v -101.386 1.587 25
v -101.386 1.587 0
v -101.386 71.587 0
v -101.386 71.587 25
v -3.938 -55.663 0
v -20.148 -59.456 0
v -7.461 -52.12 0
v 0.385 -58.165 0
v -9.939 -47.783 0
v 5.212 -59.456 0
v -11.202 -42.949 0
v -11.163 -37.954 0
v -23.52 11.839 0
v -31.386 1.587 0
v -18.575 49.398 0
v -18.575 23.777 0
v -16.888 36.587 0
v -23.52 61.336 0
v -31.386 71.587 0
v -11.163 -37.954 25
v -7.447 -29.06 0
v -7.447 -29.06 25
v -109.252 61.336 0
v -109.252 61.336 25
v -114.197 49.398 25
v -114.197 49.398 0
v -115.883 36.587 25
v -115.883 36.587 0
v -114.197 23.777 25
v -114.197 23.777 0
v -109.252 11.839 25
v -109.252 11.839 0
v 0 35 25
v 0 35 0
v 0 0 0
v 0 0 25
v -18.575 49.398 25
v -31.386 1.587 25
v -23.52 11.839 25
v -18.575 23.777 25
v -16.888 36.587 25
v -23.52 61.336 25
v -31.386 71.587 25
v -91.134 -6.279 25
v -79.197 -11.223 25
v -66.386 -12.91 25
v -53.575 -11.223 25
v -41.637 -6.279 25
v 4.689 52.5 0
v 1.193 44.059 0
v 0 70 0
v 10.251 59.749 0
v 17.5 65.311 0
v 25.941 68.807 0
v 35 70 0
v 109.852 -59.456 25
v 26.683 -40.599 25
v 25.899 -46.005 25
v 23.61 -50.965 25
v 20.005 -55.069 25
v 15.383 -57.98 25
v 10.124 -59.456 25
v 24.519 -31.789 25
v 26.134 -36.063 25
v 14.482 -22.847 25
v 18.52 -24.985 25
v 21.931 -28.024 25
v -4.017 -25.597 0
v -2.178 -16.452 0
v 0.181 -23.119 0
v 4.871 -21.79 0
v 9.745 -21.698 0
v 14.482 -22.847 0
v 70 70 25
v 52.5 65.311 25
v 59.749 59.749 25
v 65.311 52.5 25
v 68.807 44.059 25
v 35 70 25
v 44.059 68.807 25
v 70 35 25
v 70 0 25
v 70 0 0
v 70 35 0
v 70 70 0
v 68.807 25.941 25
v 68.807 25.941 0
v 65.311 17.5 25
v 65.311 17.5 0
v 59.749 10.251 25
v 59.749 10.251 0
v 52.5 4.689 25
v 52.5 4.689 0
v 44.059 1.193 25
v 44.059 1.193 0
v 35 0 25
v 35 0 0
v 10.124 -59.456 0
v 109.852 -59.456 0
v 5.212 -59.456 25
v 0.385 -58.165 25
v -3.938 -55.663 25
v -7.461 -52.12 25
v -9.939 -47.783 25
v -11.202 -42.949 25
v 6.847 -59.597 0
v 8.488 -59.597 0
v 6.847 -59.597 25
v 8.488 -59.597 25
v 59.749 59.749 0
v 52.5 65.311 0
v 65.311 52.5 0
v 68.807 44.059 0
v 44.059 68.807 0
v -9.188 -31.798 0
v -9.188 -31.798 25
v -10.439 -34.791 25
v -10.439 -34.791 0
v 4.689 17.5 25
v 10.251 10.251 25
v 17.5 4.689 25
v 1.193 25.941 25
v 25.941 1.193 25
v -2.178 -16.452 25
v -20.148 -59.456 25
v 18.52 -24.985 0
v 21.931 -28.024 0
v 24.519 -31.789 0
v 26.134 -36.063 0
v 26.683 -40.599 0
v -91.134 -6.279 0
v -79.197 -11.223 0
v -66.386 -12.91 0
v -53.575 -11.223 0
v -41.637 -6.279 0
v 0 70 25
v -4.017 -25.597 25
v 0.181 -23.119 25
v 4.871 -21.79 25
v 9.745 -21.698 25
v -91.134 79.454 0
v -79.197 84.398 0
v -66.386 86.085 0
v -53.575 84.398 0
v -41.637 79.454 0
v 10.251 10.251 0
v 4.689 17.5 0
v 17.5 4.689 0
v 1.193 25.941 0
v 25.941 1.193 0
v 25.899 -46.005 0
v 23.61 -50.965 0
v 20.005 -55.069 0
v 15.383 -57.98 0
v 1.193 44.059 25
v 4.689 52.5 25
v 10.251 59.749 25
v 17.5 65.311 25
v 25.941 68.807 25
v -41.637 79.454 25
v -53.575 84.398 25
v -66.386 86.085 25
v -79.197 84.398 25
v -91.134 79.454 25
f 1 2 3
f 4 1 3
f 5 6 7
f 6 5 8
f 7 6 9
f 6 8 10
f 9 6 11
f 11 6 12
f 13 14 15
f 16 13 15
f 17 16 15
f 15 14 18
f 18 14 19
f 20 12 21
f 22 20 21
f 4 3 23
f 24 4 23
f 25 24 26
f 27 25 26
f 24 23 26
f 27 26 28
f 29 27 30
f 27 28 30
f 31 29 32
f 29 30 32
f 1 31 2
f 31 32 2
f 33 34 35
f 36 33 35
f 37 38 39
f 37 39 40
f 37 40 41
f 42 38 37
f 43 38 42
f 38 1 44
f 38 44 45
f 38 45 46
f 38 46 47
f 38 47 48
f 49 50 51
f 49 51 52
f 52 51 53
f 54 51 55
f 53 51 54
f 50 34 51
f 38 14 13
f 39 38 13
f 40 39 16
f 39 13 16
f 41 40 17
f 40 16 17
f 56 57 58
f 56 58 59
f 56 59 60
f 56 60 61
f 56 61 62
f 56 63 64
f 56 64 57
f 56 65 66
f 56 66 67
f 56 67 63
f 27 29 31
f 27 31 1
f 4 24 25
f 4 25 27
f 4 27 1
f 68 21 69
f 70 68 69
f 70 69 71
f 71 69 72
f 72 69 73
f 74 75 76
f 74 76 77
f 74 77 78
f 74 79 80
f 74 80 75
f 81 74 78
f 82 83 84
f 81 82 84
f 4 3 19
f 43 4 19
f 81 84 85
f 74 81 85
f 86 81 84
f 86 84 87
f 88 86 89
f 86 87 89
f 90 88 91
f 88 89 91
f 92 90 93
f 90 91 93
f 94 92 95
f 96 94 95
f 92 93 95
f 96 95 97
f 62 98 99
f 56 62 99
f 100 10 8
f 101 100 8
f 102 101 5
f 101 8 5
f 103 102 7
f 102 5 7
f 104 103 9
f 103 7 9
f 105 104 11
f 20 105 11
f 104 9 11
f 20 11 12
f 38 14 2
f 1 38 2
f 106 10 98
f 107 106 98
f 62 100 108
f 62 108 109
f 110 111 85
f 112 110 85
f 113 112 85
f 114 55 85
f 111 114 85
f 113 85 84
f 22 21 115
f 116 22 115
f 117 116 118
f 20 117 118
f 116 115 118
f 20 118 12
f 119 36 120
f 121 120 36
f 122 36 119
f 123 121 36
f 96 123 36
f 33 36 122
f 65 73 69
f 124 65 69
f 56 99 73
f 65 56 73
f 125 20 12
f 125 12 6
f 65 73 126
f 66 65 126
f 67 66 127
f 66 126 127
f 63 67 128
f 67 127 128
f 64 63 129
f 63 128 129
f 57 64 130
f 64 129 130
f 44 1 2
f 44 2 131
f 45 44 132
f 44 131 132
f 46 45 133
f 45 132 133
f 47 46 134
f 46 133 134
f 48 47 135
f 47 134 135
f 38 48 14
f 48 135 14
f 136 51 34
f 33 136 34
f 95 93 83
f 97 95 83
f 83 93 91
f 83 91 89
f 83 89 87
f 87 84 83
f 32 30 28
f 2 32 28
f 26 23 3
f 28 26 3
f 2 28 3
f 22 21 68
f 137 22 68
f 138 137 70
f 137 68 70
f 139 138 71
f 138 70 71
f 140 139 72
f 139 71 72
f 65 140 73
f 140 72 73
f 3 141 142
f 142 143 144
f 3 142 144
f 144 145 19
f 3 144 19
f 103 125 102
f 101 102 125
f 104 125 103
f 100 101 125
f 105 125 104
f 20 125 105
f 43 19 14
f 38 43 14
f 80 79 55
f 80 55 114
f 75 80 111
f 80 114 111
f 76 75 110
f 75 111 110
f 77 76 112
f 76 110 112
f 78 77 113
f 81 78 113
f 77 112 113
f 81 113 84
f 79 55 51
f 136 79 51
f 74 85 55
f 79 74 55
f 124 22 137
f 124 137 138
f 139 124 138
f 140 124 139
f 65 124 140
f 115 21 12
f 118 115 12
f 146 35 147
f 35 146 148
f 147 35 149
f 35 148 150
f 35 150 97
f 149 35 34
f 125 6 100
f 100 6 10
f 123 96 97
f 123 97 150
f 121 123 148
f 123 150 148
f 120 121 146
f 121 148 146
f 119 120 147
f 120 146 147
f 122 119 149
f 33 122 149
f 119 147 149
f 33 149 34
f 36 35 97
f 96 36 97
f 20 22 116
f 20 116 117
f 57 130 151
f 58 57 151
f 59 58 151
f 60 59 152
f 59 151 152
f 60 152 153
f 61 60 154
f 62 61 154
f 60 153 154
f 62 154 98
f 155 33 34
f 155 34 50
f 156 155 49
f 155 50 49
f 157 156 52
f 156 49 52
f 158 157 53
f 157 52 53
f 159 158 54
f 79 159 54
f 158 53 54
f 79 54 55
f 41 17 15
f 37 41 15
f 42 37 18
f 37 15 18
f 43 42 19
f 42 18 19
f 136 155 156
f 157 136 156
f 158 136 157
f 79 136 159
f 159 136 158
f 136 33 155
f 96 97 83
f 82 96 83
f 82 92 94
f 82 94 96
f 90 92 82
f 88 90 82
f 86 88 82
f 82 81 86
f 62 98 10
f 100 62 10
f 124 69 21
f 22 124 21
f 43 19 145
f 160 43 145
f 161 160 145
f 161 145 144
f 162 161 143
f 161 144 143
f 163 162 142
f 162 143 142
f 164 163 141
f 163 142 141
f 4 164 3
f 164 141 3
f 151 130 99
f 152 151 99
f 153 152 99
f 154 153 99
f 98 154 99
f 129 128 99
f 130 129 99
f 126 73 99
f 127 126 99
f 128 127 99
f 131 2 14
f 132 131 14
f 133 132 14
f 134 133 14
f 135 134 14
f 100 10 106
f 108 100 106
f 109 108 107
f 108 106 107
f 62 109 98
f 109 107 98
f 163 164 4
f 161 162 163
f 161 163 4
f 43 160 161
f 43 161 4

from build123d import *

# Parameters (mm, degrees)
F1_DEPTH = 25


with BuildPart() as f1:
    # F0 (on Top) → F1 (new body)
    with BuildSketch(Plane.XY):
        with BuildLine():
            Line((35, 70), (0, 70))
            Line((0, 70), (0, 35))
            ThreePointArc((0, 35), (10.2512626585, 59.7487373415), (35, 70))
        make_face()
    extrude(amount=F1_DEPTH)


with BuildPart() as f1b:
    # F0 (on Top) → F1, piece 2 (new body)
    with BuildSketch(Plane.XY):
        with BuildLine():
            Line((70, 70), (35, 70))
            ThreePointArc((35, 70), (59.7487373415, 59.7487373415), (70, 35))
            Line((70, 35), (70, 70))
        make_face()
    extrude(amount=F1_DEPTH)


with BuildPart() as f1c:
    # F0 (on Top) → F1, piece 3 (new body)
    with BuildSketch(Plane.XY):
        with BuildLine():
            Line((70, 0), (70, 35))
            ThreePointArc((70, 35), (59.7487373415, 10.2512626585), (35, 0))
            Line((35, 0), (70, 0))
        make_face()
    extrude(amount=F1_DEPTH)


with BuildPart() as f1d:
    # F0 (on Top) → F1, piece 4 (new body)
    with BuildSketch(Plane.XY):
        with BuildLine():
            ThreePointArc((35, 0), (10.2512626585, 10.2512626585), (0, 35))
            Line((0, 35), (0, 0))
            Line((0, 0), (35, 0))
        make_face()
    extrude(amount=F1_DEPTH)


with BuildPart() as f1e:
    # F0 (on Top) → F1, piece 5 (new body)
    with BuildSketch(Plane.XY):
        with BuildLine():
            Line((-101.3856899738, 71.5874359012), (-31.3856899738, 71.5874359012))
            ThreePointArc((-31.3856899738, 71.5874359012), (-66.3856899738, 86.0849105842), (-101.3856899738, 71.5874359012))
        make_face()
    extrude(amount=F1_DEPTH)


with BuildPart() as f1f:
    # F0 (on Top) → F1, piece 6 (new body)
    with BuildSketch(Plane.XY):
        with BuildLine():
            Line((-101.3856899738, 1.5874359012), (-101.3856899738, 71.5874359012))
            ThreePointArc((-101.3856899738, 71.5874359012), (-115.8831646569, 36.5874359012), (-101.3856899738, 1.5874359012))
        make_face()
    extrude(amount=F1_DEPTH)


with BuildPart() as f1g:
    # F0 (on Top) → F1, piece 7 (new body)
    with BuildSketch(Plane.XY):
        with BuildLine():
            ThreePointArc((-101.3856899738, 1.5874359012), (-66.3856899738, -12.9100387819), (-31.3856899738, 1.5874359012))
            Line((-31.3856899738, 1.5874359012), (-101.3856899738, 1.5874359012))
        make_face()
    extrude(amount=F1_DEPTH)


with BuildPart() as f1h:
    # F0 (on Top) → F1, piece 8 (new body)
    with BuildSketch(Plane.XY):
        with BuildLine():
            ThreePointArc((-16.8882152908, 36.5874359012), (-20.6559862032, 55.5292994063), (-31.3856899738, 71.5874359012))
            Line((-31.3856899738, 71.5874359012), (-31.3856899738, 1.5874359012))
            ThreePointArc((-31.3856899738, 1.5874359012), (-20.6559862032, 17.645572396), (-16.8882152908, 36.5874359012))
        make_face()
    extrude(amount=F1_DEPTH)


with BuildPart() as f1i:
    # F0 (on Top) → F1, piece 9 (new body)
    with BuildSketch(Plane.XY):
        with BuildLine():
            Line((-11.163129075, -37.9536021835), (-20.1483034852, -59.4556791562))
            Line((-20.1483034852, -59.4556791562), (5.2115566796, -59.4556791562))
            ThreePointArc((5.2115566796, -59.4556791562), (-7.4607551529, -52.1201226883), (-11.163129075, -37.9536021835))
        make_face()
    extrude(amount=F1_DEPTH)


with BuildPart() as f1j:
    # F0 (on Top) → F1, piece 10 (new body)
    with BuildSketch(Plane.XY):
        with BuildLine():
            Line((10.1235025519, -59.4556791562), (5.2115566796, -59.4556791562))
            ThreePointArc((5.2115566796, -59.4556791562), (7.6675296157, -59.6149474626), (10.1235025519, -59.4556791562))
        make_face()
    extrude(amount=F1_DEPTH)


with BuildPart() as f1k:
    # F0 (on Top) → F1, piece 11 (new body)
    with BuildSketch(Plane.XY):
        with BuildLine():
            ThreePointArc((26.6831441913, -40.5993328871), (21.9555566392, -53.1470769657), (10.1235025519, -59.4556791562))
            Line((10.1235025519, -59.4556791562), (109.8516965148, -59.4556791562))
            Line((109.8516965148, -59.4556791562), (14.4821184378, -22.846728096))
            ThreePointArc((14.4821184378, -22.846728096), (23.3387961921, -29.828771083), (26.6831441913, -40.5993328871))
        make_face()
    extrude(amount=F1_DEPTH)


with BuildPart() as f1l:
    # F0 (on Top) → F1, piece 12 (new body)
    with BuildSketch(Plane.XY):
        with BuildLine():
            Line((-2.1779546649, -16.4515252108), (-7.4468404723, -29.0602941695))
            ThreePointArc((-7.4468404723, -29.0602941695), (2.4835453273, -22.3039808932), (14.4821184378, -22.846728096))
            Line((14.4821184378, -22.846728096), (-2.1779546649, -16.4515252108))
        make_face()
    extrude(amount=F1_DEPTH)


with BuildPart() as f1m:
    # F0 (on Top) → F1, piece 13 (new body)
    with BuildSketch(Plane.XY):
        with BuildLine():
            ThreePointArc((-7.4468404723, -29.0602941695), (-9.8778109782, -33.2675785862), (-11.163129075, -37.9536021835))
            Line((-11.163129075, -37.9536021835), (-7.4468404723, -29.0602941695))
        make_face()
    extrude(amount=F1_DEPTH)


solid = Compound([f1.part, f1b.part, f1c.part, f1d.part, f1e.part, f1f.part, f1g.part, f1h.part, f1i.part, f1j.part, f1k.part, f1l.part, f1m.part])
